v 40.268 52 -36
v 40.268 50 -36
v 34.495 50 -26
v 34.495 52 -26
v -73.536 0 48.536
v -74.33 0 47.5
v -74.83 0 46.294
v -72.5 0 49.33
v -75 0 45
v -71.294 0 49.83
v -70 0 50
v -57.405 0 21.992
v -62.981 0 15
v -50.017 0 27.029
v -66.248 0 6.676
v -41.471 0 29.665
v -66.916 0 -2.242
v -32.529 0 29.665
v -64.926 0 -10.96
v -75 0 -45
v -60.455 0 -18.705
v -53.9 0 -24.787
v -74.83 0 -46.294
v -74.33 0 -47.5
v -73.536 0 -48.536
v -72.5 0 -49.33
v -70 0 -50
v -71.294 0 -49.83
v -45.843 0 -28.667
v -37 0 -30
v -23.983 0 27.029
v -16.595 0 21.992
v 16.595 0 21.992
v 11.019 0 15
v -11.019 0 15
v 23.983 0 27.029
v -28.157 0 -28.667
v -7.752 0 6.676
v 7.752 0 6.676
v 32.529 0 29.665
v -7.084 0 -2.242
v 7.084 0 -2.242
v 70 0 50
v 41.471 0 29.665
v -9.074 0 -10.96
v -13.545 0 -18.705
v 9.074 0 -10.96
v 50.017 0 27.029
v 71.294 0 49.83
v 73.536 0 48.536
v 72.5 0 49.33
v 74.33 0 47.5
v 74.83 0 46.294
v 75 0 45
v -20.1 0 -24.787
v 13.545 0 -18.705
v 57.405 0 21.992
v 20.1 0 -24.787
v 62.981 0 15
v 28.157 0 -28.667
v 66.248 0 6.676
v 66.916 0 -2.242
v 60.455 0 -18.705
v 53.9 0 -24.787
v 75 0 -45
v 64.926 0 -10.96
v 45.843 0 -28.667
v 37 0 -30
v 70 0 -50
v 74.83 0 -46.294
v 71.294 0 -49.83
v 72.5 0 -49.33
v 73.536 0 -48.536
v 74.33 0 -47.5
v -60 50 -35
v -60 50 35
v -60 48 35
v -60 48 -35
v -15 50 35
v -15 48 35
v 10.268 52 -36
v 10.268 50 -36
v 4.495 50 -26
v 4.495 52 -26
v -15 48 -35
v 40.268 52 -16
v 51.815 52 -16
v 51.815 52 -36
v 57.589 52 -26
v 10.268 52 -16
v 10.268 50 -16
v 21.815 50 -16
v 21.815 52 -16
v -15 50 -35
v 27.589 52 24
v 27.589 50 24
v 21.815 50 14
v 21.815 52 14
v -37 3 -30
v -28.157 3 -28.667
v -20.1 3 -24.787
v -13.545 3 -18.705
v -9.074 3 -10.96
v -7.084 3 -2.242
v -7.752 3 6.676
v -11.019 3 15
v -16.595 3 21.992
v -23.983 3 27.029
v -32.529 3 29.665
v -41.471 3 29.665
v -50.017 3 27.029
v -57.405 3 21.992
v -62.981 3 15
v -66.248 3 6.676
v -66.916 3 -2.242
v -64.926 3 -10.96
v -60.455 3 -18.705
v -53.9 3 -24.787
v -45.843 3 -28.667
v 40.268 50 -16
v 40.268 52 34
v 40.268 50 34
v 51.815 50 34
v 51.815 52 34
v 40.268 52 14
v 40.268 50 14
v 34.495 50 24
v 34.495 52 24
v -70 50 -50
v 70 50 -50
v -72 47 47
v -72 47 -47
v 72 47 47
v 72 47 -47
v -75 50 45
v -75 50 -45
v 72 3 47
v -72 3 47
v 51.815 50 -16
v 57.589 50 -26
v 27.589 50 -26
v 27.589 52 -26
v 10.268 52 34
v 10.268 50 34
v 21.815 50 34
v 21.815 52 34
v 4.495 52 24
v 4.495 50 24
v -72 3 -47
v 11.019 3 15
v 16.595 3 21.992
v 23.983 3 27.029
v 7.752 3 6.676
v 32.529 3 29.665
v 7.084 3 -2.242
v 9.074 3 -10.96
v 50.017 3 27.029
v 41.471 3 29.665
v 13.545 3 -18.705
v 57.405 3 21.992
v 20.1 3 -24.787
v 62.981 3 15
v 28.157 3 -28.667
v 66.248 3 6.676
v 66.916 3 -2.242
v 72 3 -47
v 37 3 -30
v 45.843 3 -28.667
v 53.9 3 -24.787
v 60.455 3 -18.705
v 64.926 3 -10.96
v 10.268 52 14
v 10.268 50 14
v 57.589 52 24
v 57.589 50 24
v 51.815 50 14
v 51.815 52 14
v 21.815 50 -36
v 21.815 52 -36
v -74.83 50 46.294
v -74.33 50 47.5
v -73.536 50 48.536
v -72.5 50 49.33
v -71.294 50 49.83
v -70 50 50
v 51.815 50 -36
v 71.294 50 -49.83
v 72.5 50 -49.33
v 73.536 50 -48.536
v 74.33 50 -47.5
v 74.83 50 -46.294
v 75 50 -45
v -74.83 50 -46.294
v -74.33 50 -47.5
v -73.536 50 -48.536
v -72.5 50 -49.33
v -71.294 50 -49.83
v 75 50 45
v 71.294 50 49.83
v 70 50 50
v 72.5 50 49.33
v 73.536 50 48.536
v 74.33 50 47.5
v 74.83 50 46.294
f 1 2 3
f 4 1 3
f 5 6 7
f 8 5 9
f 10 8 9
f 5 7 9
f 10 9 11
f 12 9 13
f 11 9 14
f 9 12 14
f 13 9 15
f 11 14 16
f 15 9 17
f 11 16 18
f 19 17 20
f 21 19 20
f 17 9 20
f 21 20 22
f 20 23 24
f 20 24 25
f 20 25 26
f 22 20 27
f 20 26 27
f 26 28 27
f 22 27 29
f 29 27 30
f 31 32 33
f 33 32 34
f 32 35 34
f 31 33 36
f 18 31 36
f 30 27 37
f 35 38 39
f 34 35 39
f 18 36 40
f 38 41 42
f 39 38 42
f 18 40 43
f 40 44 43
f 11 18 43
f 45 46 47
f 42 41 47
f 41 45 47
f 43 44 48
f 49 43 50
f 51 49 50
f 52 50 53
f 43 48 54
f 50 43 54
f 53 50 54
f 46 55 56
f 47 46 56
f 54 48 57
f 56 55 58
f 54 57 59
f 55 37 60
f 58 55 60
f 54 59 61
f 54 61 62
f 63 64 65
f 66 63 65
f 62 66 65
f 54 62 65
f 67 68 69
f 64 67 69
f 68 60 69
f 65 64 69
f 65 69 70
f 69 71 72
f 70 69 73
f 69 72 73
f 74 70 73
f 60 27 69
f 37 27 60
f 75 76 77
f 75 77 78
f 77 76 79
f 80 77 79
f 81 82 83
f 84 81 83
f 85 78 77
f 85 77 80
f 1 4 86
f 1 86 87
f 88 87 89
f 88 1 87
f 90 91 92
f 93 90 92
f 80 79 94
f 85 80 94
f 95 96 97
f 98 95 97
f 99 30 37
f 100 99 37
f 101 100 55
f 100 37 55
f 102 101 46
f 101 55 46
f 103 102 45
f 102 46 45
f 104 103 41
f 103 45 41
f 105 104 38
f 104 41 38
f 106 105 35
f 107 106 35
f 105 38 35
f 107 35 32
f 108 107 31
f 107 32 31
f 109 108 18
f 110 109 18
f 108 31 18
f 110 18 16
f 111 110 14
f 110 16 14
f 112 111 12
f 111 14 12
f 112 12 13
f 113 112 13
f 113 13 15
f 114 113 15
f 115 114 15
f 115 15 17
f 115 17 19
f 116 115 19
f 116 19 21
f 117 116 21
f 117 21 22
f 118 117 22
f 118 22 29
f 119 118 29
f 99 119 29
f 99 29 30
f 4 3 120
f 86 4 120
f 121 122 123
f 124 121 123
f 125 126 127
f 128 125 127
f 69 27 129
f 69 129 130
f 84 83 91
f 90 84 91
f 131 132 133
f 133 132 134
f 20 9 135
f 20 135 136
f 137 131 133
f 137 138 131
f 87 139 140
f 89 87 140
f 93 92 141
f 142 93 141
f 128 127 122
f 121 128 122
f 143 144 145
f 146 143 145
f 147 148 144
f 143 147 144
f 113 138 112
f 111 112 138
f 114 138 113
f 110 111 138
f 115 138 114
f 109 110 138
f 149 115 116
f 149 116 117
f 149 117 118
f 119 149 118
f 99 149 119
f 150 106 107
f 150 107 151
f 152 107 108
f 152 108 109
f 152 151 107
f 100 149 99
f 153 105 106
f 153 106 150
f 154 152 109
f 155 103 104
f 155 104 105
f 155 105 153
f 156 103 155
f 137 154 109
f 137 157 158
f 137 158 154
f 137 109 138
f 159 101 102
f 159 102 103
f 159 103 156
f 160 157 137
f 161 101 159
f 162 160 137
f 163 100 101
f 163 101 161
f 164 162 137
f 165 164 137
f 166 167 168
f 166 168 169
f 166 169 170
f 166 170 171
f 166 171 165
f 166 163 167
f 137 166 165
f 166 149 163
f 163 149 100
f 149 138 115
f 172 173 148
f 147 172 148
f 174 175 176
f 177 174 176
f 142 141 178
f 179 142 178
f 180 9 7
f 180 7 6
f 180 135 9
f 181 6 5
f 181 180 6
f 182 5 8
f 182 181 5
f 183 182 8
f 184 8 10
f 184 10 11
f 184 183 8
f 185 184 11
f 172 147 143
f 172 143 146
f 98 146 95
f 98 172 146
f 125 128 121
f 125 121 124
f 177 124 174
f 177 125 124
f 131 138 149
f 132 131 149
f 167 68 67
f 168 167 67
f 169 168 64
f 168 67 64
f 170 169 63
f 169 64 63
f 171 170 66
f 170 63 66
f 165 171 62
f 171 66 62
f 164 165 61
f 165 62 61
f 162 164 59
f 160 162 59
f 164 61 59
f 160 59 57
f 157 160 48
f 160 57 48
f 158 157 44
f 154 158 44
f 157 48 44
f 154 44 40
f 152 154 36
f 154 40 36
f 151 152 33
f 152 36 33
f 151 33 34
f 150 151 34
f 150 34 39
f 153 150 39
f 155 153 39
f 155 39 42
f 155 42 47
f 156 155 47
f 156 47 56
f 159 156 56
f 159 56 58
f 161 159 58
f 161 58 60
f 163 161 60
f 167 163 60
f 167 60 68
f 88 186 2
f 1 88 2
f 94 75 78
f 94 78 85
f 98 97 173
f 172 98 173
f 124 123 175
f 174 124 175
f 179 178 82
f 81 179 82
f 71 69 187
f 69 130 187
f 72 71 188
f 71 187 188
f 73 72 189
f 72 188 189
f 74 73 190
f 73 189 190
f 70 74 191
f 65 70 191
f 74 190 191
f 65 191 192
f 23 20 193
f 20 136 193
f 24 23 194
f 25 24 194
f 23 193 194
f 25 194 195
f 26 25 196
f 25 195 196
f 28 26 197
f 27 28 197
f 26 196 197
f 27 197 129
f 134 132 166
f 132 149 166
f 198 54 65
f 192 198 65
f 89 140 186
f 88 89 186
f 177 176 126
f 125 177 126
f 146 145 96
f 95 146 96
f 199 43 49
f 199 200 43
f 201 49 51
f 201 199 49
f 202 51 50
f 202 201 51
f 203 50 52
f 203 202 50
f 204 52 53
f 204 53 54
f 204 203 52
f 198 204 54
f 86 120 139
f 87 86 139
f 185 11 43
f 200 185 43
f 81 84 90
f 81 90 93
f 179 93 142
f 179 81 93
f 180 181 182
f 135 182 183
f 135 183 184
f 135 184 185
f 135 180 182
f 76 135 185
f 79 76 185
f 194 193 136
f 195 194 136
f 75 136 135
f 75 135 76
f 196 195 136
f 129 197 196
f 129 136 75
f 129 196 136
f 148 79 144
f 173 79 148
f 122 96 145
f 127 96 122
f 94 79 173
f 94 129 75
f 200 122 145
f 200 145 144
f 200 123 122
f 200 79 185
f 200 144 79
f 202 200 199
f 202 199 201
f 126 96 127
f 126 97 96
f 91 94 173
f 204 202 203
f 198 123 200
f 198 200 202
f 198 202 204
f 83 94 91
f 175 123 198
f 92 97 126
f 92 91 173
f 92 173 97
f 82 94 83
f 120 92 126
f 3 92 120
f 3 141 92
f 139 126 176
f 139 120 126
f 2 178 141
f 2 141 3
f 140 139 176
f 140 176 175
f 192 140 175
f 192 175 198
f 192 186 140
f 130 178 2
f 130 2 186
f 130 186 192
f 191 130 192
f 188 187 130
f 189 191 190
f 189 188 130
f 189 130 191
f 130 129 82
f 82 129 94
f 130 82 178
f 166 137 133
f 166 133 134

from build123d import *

# Parameters (mm, degrees)
SKETCH1_W           = 150
SKETCH1_H           = 100
BOSS_EXTRUDE1_DEPTH = 50
SHELL1_T            = 3
SKETCH3_R           = 30
CUT_EXTRUDE2_DEPTH  = 5
SKETCH4_W           = 45
SKETCH4_H           = 70
CUT_EXTRUDE3_DEPTH  = 2
BOSS_EXTRUDE2_DEPTH = 2
FILLET1_R           = 5


with BuildPart() as part:
    # Sketch1 → Boss-Extrude1 (new body)
    with BuildSketch(Plane(origin=(0, 0, 0), x_dir=(1, 0, 0), z_dir=(0, 1, 0))):
        Rectangle(SKETCH1_W, SKETCH1_H)
    extrude(amount=BOSS_EXTRUDE1_DEPTH)

    # Shell1 (no face opened: a closed hollow body)
    add(offset(amount=-SHELL1_T, mode=Mode.PRIVATE), mode=Mode.SUBTRACT)

    # Sketch3 → Cut-Extrude2 (cut)
    with BuildSketch(Plane.XZ):
        with Locations(Location((37, 0, 0), (0, 0, 270))):
            Circle(SKETCH3_R)
        with Locations(Location((-37, 0, 0), (0, 0, 270))):
            Circle(SKETCH3_R)
    extrude(amount=-CUT_EXTRUDE2_DEPTH, mode=Mode.SUBTRACT)

    # Sketch4 → Cut-Extrude3 (cut)
    with BuildSketch(Plane(origin=(0, 50, 0), x_dir=(1, 0, 0), z_dir=(0, 1, 0))):
        with Locations((-37.5, 0)):
            Rectangle(SKETCH4_W, SKETCH4_H)
    extrude(amount=-CUT_EXTRUDE3_DEPTH, mode=Mode.SUBTRACT)

    # Sketch5 → Boss-Extrude2 (add)
    with BuildSketch(Plane(origin=(0, 50, 0), x_dir=(1, 0, 0), z_dir=(0, 1, 0))):
        Polygon((57.58863582, -24), (51.815133128, -14), (40.268127744, -14), (34.494625052, -24), (40.268127744, -34), (51.815133128, -34), align=None)
        Polygon((27.58863582, -24), (21.815133128, -14), (10.268127744, -14), (4.494625052, -24), (10.268127744, -34), (21.815133128, -34), align=None)
        Polygon((57.58863582, 26), (51.815133128, 36), (40.268127744, 36), (34.494625052, 26), (40.268127744, 16), (51.815133128, 16), align=None)
        Polygon((27.58863582, 26), (21.815133128, 36), (10.268127744, 36), (4.494625052, 26), (10.268127744, 16), (21.815133128, 16), align=None)
    extrude(amount=BOSS_EXTRUDE2_DEPTH)

    # Fillet1
    fillet1_edges = [part.edges().sort_by_distance(p)[0] for p in [
        (75, 25, 50),
        (-75, 25, 50),
        (-75, 25, -50),
        (75, 25, -50),
    ]]
    fillet(fillet1_edges, radius=FILLET1_R)


solid = part.part
